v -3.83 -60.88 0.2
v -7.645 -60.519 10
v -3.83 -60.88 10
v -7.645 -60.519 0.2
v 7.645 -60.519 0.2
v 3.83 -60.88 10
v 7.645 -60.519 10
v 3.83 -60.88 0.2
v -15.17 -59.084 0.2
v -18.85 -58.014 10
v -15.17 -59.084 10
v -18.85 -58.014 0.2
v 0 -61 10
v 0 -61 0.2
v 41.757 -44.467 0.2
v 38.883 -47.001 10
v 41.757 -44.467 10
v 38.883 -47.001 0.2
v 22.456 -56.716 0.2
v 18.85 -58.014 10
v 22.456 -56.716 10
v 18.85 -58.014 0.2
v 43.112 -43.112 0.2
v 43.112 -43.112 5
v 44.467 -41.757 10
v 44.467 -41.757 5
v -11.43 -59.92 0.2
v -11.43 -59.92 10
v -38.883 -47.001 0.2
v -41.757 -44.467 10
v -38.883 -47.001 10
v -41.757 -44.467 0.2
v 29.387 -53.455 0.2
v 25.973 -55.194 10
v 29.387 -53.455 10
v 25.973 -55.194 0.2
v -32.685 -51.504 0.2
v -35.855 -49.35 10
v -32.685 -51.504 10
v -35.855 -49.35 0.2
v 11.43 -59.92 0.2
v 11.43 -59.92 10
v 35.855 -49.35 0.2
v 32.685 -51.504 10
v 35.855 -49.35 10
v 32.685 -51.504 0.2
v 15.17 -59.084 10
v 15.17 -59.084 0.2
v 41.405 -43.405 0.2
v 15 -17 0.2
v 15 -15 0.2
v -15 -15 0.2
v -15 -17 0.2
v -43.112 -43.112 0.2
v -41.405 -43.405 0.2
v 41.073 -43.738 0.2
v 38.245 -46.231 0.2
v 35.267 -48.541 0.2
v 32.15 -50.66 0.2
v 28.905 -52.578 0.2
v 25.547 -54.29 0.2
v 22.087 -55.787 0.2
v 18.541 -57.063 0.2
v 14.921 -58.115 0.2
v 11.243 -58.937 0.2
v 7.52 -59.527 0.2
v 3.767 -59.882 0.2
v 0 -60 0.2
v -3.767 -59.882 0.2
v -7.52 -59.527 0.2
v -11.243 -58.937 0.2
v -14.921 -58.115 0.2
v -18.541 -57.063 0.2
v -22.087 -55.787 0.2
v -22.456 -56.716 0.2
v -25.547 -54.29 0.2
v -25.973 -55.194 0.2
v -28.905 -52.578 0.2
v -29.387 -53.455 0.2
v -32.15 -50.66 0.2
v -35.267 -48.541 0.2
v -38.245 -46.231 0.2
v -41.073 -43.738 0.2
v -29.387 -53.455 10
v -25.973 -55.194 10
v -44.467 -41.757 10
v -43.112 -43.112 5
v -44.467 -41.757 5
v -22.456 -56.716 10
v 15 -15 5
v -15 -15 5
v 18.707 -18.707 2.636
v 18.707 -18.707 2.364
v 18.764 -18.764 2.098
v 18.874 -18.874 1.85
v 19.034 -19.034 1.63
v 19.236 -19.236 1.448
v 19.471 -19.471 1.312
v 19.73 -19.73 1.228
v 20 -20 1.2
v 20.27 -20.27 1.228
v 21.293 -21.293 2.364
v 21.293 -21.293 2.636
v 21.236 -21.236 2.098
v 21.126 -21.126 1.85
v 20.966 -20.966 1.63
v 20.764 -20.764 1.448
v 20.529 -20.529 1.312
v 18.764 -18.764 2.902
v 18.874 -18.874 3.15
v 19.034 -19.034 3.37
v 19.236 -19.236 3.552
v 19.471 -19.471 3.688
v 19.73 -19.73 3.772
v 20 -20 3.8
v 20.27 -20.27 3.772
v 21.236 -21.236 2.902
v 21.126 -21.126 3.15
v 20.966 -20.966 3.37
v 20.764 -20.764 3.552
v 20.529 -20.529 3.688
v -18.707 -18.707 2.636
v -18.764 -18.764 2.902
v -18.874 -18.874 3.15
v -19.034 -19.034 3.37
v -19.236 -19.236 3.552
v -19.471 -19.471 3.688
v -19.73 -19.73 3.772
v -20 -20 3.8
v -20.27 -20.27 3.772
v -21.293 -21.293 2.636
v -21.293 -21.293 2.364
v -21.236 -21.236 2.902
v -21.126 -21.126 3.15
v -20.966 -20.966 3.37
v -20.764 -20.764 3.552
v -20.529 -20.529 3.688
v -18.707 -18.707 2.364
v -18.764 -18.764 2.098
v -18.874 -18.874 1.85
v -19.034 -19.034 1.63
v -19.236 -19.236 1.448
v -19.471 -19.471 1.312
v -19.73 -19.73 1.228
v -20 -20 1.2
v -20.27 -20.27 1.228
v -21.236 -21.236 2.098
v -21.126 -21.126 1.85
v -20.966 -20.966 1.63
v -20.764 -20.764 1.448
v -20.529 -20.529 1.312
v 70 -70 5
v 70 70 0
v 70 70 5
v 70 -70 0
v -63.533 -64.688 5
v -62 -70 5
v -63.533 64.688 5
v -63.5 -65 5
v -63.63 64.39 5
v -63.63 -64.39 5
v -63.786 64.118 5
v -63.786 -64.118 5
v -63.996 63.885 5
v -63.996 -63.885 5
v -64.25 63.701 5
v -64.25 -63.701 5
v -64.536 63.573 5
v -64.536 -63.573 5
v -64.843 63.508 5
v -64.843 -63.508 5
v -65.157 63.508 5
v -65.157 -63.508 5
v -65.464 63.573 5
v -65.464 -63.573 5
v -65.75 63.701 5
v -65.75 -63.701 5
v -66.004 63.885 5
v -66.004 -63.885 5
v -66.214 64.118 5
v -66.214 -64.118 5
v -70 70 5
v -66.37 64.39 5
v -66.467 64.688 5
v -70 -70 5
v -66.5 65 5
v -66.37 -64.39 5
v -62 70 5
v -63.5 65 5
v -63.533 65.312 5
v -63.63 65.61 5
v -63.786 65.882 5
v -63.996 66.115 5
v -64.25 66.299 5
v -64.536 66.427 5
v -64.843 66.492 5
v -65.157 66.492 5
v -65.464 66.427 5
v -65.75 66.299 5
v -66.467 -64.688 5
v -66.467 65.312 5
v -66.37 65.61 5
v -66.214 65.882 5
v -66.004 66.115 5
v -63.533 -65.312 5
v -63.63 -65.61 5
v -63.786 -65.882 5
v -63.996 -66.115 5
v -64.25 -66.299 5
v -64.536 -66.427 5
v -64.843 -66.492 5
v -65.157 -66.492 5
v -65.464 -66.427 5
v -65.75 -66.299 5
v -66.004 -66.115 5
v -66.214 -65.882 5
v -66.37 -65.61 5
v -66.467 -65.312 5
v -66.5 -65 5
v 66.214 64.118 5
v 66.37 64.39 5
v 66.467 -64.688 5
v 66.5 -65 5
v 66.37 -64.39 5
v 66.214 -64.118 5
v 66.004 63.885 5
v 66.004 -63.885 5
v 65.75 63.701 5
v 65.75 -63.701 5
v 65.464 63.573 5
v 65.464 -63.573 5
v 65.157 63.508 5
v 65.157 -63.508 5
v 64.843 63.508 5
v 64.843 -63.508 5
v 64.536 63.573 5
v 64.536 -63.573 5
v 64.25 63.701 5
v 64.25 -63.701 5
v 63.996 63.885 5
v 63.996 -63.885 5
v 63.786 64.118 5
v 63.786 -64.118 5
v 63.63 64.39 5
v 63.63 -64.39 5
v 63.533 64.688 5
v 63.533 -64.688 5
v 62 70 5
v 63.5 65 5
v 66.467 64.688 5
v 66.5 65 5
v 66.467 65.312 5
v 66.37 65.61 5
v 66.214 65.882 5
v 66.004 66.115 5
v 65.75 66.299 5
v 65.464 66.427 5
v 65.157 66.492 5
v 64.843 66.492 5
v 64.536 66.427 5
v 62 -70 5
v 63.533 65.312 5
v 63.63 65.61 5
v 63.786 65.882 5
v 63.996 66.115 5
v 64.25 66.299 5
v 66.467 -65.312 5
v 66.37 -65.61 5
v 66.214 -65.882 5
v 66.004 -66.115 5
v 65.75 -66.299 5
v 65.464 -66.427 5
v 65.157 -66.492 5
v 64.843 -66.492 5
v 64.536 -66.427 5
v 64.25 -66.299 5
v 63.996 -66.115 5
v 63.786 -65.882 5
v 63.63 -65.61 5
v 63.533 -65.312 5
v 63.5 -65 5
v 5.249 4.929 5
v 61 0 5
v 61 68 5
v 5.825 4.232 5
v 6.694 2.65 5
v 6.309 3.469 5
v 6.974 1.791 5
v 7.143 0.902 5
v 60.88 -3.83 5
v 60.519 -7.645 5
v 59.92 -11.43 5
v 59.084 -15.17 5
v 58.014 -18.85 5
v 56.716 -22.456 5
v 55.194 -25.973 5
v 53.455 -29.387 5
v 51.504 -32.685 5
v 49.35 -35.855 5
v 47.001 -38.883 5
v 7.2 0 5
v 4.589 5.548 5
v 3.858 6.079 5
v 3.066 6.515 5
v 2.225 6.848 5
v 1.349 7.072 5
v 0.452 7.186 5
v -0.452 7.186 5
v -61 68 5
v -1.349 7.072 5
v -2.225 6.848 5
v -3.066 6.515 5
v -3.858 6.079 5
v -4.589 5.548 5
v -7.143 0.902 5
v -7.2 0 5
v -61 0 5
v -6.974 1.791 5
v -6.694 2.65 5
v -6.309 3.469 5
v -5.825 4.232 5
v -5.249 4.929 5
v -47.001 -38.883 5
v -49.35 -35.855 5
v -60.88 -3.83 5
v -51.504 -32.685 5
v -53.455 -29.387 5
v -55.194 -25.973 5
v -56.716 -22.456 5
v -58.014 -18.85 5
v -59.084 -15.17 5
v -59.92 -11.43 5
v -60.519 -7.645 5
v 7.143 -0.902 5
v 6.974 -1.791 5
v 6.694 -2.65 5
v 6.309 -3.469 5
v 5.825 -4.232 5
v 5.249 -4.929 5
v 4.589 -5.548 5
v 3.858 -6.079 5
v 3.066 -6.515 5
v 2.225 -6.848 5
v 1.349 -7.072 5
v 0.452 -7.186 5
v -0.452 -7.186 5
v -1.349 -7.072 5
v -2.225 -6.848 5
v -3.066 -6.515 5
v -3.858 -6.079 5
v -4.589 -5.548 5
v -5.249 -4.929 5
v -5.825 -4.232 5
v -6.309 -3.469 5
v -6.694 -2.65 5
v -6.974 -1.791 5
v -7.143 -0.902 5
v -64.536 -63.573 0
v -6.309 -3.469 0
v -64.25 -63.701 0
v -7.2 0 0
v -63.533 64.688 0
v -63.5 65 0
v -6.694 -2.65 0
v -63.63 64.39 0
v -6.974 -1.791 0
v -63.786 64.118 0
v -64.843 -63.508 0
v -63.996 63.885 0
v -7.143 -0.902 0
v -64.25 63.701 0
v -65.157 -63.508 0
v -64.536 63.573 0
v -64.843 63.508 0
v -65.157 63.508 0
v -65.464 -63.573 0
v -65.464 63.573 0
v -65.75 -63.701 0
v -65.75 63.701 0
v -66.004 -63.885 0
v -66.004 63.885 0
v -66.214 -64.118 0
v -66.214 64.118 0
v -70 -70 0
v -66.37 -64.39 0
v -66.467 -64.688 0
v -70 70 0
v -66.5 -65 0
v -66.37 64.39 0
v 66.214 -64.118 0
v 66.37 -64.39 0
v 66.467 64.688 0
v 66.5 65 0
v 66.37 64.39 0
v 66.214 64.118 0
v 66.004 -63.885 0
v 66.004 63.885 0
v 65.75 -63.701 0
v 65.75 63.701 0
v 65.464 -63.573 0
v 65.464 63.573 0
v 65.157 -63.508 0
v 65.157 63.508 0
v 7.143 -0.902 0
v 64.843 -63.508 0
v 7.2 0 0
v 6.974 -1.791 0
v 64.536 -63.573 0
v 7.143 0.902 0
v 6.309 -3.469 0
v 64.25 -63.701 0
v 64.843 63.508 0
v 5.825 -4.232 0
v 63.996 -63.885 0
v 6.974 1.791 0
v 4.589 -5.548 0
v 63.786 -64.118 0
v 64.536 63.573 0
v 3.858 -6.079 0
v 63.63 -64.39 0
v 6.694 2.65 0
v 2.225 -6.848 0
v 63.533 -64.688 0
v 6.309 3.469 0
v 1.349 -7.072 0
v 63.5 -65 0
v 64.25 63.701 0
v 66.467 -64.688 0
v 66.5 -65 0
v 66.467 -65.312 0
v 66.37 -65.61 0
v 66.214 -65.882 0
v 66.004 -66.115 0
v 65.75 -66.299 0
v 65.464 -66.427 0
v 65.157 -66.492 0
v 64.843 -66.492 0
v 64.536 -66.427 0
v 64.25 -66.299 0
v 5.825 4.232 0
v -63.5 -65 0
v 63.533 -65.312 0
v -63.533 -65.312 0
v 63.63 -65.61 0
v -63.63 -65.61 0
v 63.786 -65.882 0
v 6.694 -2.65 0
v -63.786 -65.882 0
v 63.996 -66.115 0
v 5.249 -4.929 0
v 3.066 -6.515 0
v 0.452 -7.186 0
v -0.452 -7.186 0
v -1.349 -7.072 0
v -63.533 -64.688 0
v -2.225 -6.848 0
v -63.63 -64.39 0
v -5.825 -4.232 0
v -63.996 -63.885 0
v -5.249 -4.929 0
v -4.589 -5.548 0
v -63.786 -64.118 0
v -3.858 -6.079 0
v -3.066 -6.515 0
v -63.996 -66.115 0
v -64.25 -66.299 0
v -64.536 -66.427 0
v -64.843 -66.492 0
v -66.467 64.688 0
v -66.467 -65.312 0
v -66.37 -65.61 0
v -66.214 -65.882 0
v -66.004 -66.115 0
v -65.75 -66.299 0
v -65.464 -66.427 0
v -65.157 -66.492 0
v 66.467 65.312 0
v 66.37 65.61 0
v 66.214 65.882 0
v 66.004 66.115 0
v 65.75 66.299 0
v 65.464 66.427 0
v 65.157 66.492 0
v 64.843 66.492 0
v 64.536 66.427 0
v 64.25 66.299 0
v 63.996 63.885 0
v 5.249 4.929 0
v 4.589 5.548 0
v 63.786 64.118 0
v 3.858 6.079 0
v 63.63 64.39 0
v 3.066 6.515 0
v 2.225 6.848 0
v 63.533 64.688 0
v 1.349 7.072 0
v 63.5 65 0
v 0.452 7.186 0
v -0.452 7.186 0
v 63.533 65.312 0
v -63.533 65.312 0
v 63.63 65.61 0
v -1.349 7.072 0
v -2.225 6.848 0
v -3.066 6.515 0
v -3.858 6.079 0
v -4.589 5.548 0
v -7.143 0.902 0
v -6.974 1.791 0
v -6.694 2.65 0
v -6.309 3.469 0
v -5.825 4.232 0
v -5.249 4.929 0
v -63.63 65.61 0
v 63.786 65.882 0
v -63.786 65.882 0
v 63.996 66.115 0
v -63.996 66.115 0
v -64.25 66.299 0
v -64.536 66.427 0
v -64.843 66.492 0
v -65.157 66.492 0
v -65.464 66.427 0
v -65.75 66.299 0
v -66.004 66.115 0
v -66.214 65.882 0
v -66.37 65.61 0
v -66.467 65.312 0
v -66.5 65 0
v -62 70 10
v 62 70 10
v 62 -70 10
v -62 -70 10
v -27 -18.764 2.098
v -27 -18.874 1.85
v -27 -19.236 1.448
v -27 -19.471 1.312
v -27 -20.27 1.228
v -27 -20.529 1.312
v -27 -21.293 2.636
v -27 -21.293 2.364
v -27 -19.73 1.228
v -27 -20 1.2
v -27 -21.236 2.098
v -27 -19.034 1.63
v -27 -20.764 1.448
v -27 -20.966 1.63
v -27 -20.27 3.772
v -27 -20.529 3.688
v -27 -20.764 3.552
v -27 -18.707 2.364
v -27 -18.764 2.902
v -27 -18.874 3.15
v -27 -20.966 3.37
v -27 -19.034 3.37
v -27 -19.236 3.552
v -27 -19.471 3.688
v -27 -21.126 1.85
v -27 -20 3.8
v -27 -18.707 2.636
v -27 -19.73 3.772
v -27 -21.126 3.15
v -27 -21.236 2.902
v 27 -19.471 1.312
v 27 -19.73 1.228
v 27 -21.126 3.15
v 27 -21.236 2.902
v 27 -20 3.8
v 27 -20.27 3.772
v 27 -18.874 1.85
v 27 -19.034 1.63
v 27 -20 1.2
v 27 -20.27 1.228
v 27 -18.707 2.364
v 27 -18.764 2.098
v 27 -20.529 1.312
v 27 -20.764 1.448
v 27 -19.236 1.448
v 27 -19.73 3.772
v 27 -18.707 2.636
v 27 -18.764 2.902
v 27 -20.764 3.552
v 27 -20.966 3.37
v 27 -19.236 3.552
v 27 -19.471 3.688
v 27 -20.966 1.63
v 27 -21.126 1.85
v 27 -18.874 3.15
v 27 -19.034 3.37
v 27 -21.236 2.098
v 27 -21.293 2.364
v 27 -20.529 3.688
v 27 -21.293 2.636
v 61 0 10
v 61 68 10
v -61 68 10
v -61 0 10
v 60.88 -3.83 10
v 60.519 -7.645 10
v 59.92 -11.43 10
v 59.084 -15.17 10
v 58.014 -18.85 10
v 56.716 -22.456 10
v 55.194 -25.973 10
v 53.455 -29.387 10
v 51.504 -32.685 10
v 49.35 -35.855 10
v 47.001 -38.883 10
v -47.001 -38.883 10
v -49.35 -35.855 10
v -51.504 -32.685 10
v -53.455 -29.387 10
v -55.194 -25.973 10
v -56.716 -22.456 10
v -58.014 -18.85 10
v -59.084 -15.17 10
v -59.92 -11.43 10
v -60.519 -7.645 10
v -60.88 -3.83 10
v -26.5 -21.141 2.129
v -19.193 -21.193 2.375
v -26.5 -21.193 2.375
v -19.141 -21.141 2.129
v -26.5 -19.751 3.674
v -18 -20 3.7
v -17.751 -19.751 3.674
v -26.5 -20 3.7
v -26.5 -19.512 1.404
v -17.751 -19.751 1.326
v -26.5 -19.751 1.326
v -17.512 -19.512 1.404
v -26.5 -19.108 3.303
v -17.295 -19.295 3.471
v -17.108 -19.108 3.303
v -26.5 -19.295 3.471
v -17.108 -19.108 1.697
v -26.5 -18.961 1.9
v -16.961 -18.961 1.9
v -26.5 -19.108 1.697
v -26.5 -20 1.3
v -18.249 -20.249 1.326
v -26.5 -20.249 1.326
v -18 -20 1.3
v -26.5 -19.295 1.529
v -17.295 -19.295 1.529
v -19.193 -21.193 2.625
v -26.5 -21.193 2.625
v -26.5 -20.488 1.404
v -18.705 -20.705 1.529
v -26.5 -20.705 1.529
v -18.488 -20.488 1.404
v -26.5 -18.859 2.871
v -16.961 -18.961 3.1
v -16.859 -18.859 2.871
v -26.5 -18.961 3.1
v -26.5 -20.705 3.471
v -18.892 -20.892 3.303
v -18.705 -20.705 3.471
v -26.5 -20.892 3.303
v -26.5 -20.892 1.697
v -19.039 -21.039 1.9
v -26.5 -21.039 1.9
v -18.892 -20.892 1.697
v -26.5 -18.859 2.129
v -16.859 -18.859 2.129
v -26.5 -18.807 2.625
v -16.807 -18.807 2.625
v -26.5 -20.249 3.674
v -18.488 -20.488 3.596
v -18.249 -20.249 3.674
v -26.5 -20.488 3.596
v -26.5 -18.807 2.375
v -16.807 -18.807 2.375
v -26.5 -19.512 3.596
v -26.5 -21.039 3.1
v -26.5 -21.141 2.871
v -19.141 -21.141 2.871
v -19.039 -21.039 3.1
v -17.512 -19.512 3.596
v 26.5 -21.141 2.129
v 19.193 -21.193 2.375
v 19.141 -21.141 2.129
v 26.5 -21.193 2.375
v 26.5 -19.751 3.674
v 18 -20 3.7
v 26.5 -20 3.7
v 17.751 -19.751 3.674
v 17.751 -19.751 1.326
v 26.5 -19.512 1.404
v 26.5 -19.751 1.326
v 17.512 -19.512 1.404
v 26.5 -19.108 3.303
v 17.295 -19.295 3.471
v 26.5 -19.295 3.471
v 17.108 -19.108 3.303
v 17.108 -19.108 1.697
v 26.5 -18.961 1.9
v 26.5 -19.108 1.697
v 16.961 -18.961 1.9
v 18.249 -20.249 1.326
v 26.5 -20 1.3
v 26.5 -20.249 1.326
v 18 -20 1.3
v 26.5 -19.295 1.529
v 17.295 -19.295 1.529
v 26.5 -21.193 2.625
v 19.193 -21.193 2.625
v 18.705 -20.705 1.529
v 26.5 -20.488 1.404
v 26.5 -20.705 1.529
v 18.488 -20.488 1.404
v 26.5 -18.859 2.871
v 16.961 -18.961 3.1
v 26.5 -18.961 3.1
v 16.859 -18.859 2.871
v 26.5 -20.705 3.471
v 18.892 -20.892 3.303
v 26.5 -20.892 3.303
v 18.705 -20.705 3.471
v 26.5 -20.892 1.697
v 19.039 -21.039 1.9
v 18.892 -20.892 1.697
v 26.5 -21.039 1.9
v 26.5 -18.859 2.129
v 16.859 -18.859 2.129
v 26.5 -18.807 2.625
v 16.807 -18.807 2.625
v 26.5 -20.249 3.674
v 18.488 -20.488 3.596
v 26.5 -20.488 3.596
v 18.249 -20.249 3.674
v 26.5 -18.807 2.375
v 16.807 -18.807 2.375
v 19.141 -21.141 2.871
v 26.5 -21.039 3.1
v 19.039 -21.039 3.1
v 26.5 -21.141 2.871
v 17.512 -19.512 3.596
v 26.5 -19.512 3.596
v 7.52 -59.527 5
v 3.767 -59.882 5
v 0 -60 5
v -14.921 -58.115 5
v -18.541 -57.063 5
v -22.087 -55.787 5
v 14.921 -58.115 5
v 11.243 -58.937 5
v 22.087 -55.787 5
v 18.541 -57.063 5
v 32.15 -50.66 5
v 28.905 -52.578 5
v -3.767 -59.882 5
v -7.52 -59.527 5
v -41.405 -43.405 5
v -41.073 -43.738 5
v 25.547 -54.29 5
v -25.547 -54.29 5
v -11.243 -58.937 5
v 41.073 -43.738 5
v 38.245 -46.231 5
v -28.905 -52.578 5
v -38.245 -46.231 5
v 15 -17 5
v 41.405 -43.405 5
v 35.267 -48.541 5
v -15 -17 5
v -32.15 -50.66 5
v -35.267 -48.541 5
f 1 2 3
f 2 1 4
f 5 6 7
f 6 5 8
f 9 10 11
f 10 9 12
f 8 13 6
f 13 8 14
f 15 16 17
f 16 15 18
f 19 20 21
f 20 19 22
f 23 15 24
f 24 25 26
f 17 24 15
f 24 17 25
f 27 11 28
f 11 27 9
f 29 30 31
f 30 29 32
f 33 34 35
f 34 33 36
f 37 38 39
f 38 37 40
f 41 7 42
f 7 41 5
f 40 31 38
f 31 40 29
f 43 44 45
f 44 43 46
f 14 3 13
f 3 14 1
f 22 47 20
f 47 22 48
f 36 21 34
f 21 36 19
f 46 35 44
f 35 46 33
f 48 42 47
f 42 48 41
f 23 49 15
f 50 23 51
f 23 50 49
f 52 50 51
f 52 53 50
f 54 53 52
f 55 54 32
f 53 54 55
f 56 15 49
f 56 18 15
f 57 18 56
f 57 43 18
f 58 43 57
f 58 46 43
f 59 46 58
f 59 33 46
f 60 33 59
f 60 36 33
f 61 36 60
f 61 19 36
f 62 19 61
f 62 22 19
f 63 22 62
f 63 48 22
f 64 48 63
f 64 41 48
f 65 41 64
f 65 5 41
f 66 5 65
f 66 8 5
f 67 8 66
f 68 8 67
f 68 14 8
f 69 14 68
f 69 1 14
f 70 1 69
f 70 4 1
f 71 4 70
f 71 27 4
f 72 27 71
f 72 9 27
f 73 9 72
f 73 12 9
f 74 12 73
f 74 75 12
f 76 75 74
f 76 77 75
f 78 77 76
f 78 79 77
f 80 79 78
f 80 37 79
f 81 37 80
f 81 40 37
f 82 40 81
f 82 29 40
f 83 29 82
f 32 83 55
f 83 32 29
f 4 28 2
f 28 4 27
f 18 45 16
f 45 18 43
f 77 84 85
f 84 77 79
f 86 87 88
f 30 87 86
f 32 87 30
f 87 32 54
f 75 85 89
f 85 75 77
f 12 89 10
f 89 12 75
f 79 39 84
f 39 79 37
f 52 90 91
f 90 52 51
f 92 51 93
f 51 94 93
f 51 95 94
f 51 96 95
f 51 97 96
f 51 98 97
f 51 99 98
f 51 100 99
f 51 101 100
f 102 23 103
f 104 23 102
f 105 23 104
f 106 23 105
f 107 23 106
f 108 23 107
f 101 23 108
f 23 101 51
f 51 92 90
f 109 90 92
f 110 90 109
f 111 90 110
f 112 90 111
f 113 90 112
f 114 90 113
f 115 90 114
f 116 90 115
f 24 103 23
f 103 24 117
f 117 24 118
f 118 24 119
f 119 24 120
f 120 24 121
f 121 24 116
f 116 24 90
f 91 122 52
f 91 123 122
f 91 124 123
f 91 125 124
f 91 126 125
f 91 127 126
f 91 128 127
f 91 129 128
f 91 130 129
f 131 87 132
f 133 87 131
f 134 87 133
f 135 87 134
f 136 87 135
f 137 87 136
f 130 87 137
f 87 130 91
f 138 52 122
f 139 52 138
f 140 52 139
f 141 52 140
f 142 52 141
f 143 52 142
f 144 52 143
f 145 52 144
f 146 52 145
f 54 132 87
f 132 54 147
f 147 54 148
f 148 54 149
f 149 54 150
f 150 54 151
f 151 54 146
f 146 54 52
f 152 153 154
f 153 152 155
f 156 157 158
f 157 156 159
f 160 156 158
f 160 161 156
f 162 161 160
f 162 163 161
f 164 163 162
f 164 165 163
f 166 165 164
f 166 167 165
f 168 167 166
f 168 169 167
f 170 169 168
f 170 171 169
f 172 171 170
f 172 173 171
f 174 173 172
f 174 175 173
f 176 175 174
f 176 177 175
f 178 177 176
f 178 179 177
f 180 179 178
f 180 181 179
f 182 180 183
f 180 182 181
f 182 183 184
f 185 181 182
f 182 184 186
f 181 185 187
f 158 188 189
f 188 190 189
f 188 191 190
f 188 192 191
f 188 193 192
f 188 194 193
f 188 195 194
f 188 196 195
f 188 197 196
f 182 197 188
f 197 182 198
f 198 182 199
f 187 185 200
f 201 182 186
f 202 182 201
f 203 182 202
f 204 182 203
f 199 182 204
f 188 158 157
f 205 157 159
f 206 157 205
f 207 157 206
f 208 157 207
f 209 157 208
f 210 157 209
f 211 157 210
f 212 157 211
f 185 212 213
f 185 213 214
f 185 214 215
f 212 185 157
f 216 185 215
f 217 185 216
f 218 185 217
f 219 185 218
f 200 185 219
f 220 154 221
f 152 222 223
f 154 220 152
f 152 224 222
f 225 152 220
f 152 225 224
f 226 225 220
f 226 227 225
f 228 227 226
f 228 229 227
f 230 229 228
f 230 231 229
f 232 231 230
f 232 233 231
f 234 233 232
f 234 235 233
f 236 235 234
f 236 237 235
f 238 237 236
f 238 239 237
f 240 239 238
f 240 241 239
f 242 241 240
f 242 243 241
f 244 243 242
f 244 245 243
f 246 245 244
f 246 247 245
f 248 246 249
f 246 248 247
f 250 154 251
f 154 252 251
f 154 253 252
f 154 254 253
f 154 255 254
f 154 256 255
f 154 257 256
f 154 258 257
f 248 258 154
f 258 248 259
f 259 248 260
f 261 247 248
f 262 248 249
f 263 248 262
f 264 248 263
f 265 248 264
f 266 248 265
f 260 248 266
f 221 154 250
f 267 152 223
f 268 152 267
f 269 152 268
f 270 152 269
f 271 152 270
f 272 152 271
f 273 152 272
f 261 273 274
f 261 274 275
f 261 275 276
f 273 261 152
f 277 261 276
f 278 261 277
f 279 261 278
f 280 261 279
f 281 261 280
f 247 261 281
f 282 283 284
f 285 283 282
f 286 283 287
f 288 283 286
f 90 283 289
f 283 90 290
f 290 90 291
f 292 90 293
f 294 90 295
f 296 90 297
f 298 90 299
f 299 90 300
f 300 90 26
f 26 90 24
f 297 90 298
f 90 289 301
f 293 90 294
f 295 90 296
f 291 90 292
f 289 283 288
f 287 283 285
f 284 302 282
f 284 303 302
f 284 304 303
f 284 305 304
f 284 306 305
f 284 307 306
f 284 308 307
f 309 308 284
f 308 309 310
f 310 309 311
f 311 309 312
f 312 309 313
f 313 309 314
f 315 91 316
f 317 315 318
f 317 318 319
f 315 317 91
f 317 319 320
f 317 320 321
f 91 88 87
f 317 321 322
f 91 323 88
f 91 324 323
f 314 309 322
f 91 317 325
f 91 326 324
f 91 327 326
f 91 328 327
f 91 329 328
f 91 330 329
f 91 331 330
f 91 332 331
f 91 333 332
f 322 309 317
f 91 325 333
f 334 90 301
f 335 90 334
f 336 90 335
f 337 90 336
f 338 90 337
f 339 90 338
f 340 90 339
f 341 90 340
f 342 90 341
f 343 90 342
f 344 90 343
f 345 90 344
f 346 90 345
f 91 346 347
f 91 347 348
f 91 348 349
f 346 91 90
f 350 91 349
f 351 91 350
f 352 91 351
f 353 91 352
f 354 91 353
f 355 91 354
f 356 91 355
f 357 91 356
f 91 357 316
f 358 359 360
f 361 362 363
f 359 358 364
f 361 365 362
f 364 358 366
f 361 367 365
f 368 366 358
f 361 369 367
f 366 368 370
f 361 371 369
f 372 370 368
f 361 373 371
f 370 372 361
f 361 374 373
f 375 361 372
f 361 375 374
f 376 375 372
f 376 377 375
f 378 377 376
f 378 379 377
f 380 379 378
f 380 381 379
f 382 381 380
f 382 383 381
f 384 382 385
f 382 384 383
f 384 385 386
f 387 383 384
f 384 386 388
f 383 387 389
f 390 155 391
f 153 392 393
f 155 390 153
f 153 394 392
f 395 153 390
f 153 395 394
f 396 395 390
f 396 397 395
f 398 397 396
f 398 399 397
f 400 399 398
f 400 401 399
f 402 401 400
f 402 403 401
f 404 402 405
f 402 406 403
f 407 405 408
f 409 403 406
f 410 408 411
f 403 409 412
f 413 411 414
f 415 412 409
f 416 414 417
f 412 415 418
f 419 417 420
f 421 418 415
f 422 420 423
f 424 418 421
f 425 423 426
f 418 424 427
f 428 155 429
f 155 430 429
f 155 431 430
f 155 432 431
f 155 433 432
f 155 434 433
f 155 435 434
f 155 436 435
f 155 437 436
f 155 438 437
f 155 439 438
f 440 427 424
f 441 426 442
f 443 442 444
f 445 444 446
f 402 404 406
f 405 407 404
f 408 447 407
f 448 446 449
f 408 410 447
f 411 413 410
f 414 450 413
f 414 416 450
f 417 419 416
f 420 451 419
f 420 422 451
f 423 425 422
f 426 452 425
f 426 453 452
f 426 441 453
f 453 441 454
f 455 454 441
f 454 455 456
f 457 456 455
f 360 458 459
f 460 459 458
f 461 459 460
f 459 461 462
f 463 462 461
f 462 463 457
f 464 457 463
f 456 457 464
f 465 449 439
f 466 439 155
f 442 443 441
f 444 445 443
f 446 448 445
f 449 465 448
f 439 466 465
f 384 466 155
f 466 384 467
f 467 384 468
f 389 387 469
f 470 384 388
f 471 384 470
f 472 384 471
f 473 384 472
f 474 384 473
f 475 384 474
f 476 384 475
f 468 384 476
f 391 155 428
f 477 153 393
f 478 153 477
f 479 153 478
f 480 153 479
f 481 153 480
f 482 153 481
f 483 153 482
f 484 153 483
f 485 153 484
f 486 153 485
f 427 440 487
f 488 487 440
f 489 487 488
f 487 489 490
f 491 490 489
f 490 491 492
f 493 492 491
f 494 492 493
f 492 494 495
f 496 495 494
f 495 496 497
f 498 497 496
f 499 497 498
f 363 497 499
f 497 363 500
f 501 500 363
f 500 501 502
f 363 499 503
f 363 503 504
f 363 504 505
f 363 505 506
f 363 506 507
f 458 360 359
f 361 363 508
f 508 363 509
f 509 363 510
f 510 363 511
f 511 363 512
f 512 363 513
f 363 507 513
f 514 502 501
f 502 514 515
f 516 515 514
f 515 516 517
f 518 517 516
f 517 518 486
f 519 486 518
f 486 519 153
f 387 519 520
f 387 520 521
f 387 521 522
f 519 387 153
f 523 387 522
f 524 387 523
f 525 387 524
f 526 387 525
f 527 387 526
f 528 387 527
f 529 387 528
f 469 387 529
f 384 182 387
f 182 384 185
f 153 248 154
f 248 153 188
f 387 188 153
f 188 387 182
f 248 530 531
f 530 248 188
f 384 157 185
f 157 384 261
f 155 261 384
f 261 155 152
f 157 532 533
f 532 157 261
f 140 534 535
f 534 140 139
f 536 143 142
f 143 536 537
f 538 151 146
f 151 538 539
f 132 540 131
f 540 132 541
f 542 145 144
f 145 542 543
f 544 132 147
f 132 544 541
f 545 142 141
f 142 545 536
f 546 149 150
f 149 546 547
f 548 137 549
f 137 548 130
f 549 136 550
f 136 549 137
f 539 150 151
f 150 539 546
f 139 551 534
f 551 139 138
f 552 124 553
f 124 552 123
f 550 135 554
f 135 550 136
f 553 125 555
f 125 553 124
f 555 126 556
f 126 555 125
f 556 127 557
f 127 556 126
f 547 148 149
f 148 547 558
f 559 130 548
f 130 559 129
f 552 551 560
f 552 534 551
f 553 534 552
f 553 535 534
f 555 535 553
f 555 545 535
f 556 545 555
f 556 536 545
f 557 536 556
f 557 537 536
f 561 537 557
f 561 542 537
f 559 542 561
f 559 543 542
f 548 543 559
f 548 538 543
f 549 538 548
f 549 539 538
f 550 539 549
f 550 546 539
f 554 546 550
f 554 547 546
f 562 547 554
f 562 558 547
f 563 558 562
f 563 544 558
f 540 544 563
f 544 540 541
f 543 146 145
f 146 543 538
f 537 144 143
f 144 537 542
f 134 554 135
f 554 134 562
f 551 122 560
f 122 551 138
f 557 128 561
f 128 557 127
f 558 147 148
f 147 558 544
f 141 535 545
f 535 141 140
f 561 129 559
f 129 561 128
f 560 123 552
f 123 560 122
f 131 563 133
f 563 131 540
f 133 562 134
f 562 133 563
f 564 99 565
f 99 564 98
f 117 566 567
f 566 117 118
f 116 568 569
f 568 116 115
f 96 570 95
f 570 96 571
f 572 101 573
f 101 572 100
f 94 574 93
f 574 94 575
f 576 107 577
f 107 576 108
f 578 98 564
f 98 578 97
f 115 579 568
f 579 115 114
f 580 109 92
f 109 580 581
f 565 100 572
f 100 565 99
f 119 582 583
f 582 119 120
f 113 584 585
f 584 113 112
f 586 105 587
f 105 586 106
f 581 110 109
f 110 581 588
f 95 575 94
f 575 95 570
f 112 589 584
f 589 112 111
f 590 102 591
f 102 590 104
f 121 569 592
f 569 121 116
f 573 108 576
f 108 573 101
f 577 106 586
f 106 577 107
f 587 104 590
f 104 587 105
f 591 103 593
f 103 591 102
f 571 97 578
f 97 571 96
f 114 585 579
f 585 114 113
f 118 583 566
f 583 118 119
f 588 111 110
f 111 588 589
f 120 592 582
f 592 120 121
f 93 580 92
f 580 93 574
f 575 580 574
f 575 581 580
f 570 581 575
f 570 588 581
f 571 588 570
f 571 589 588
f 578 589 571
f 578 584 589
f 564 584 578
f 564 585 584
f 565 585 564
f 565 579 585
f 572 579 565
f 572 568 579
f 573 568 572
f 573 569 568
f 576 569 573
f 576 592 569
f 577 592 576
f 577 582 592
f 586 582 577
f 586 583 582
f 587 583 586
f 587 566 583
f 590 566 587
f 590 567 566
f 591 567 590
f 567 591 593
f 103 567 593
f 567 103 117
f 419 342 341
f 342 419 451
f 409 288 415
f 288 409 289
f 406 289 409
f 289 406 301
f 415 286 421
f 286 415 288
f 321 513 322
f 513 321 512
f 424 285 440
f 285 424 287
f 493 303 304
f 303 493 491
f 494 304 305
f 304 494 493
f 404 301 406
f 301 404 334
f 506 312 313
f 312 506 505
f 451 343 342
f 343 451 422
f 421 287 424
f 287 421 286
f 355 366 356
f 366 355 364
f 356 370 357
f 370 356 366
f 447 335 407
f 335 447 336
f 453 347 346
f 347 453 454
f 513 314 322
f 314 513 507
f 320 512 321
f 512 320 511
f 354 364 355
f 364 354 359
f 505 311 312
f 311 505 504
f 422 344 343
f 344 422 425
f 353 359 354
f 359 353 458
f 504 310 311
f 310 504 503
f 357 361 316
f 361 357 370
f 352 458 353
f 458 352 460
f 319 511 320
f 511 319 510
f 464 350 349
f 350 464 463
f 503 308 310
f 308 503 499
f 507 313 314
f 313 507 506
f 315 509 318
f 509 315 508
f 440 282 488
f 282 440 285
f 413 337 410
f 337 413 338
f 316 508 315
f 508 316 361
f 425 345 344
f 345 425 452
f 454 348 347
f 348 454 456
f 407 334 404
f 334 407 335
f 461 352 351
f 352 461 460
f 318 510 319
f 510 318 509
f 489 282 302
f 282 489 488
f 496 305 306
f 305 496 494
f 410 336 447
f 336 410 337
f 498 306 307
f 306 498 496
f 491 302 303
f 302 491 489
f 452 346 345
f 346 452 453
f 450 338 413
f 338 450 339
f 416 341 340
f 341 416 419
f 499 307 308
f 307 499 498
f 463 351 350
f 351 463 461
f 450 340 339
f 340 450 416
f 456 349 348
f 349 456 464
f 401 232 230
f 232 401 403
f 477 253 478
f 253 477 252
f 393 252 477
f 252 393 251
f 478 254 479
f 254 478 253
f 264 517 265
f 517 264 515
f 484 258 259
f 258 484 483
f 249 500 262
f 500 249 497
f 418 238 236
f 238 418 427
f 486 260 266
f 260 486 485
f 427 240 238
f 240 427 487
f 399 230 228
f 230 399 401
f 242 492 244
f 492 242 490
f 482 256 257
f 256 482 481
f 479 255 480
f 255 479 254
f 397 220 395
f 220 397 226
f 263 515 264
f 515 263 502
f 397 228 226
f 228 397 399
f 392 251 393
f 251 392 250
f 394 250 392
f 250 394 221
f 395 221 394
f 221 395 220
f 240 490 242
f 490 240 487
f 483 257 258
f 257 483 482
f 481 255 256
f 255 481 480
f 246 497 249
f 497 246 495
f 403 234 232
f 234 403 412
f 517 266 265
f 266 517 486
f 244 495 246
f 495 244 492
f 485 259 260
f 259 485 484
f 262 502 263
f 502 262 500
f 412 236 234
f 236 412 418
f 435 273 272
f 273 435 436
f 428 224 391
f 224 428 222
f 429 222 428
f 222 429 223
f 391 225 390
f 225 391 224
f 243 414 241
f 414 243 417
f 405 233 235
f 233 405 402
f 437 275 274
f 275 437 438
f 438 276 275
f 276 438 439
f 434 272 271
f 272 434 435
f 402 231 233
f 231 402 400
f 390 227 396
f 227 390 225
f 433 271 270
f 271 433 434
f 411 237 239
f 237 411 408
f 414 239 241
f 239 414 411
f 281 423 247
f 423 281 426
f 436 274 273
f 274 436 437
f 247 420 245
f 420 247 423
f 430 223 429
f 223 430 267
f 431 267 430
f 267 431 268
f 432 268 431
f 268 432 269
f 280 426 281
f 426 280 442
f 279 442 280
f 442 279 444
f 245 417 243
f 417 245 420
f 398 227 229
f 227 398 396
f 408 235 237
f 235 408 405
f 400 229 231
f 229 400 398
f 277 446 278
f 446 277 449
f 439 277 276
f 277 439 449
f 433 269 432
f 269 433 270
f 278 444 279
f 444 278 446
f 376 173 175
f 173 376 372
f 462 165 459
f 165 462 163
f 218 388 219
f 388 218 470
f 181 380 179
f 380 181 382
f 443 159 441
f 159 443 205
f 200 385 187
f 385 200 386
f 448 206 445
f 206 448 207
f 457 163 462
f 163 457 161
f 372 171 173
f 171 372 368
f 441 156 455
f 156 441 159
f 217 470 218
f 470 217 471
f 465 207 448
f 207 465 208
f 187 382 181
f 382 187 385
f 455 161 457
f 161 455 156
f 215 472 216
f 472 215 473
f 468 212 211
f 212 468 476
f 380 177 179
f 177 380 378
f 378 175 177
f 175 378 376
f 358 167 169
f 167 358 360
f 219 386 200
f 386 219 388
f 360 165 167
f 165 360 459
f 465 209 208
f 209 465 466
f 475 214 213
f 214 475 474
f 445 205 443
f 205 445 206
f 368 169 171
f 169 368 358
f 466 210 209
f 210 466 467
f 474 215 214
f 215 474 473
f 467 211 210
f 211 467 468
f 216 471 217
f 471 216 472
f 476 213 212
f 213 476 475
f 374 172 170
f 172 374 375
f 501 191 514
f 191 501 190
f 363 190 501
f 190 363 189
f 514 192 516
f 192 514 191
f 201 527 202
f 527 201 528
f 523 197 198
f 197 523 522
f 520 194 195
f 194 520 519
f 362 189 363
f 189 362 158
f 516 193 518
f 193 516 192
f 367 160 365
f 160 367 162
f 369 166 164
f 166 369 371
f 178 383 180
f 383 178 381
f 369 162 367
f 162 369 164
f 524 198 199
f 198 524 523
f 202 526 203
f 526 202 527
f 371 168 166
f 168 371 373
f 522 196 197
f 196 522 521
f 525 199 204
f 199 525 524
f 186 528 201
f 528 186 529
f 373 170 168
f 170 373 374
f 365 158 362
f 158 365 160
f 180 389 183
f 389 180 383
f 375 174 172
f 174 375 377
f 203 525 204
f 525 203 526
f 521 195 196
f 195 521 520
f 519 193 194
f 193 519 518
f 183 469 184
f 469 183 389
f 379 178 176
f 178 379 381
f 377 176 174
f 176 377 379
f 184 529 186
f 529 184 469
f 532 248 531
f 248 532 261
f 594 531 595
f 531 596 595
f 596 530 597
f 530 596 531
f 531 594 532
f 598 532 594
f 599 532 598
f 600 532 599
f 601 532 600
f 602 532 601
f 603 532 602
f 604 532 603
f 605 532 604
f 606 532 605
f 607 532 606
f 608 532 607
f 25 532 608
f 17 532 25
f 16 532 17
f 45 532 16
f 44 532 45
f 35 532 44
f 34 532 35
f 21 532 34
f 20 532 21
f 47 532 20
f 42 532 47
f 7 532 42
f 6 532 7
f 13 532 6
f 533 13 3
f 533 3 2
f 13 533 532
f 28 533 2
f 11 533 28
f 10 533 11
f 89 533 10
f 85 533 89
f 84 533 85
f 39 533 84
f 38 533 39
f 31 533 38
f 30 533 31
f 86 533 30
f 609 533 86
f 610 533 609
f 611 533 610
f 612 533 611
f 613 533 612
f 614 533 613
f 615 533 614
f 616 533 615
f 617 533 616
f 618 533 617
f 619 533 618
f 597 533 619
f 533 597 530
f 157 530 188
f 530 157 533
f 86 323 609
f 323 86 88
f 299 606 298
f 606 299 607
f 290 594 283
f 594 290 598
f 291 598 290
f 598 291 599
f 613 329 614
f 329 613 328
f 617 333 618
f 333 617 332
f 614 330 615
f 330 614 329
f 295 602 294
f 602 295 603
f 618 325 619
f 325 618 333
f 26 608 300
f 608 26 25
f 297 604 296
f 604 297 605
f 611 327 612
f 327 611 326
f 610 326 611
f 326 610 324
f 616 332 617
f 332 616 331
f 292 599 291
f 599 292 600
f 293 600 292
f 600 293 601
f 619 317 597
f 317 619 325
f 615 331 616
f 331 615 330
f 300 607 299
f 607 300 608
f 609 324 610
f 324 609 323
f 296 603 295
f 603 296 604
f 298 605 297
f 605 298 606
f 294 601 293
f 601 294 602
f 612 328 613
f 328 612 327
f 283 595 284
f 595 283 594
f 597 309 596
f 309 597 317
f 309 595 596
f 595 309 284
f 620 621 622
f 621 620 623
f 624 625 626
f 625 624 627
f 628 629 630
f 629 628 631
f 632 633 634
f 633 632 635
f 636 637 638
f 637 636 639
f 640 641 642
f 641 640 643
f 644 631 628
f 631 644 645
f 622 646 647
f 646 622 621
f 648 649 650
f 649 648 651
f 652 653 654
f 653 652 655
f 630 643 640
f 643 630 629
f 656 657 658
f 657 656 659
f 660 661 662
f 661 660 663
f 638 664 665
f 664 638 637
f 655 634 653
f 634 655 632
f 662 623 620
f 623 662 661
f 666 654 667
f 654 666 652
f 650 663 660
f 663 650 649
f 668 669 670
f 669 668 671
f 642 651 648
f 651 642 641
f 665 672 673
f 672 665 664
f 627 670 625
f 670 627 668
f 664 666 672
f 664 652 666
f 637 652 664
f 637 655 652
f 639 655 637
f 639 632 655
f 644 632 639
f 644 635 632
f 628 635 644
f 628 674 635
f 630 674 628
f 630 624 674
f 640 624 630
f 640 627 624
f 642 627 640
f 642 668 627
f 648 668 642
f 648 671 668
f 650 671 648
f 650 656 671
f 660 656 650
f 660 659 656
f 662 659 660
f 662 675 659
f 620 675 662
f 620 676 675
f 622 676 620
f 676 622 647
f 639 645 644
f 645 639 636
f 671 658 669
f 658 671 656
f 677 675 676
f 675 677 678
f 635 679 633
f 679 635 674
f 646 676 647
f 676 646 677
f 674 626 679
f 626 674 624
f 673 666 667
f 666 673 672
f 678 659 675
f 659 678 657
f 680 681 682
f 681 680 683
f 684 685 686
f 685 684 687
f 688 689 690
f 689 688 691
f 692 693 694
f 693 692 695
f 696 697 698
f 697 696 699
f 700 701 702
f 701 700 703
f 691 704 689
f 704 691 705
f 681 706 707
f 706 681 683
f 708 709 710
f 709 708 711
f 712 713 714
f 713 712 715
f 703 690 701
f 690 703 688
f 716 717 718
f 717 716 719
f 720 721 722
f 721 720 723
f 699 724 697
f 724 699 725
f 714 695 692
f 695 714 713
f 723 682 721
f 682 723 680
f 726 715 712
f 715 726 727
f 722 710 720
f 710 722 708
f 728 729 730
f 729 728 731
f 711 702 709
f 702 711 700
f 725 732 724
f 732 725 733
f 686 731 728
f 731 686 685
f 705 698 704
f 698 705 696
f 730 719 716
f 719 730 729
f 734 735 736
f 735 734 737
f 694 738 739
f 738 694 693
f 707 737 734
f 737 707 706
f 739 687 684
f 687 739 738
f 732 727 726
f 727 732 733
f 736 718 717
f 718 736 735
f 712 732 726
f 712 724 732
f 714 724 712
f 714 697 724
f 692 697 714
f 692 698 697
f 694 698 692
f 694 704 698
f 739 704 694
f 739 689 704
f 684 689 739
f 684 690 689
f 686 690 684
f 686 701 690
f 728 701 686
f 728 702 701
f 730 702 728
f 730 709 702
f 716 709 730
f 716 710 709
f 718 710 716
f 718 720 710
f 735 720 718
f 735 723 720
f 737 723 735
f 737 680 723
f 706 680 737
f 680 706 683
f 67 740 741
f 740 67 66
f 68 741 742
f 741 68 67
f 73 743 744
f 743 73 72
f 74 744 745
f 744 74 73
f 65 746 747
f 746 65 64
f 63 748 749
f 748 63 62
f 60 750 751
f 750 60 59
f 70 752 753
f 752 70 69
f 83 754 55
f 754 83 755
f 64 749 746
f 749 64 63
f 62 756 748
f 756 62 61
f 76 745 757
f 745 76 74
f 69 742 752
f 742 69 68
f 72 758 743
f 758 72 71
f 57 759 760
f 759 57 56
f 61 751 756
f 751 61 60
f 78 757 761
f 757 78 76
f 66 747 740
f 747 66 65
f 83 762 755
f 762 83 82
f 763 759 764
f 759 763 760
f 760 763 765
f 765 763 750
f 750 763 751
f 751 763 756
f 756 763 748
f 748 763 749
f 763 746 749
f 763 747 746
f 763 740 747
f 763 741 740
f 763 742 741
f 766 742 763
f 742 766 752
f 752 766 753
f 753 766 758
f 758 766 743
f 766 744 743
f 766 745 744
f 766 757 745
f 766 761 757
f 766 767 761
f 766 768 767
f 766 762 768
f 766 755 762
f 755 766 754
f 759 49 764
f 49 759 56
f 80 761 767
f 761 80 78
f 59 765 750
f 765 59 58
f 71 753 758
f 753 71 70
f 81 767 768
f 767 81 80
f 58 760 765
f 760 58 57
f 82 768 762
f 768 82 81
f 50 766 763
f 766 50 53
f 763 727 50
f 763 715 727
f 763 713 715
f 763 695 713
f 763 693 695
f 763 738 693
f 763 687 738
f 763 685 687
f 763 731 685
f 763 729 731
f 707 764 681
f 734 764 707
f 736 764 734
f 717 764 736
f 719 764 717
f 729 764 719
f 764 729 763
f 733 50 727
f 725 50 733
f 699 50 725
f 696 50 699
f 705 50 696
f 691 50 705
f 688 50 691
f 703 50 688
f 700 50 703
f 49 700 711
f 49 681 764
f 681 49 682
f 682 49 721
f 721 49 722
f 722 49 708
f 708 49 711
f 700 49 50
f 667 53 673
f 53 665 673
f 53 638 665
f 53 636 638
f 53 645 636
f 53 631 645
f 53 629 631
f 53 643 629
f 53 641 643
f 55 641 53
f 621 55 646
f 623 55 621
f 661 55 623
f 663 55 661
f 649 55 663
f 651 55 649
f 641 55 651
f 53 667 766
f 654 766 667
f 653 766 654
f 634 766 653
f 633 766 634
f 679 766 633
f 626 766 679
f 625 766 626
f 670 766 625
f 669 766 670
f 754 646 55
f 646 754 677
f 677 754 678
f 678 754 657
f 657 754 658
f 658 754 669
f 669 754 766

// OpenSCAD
union() {
  difference(){
    // Frame
    translate([-70,-70,0]) cube([140,140,5], false);
    // Auger inset
    //translate([0,0,2]) cylinder(3, 60, 60, false, $fn=50);
    
    // Food Opening
    translate([0,0,0.2]) difference(){
      cylinder(10, 61, 61, false, $fn=100);
      //cylinder(10, 16, 16, false, $fn=100);
      translate([-70,-15,0]) cube([140,140,10], false);
      rotate([0,0,-45]) cube([65,65,10], false);
      rotate([0,0,45]) cube([65,65,10], false);
      rotate([0,0,135]) cube([65,65,10], false);
    }
    
    translate([-22,-20,2.5]) rotate([0,90,0]) cylinder(10,1.3,1.3,true,$fn=30);
    translate([22,-20,2.5]) rotate([0,90,0]) cylinder(10,1.3,1.3,true,$fn=30);
    
    // Inner Axel
    cylinder(10, 7.2, 7.2, false, $fn=50);
    
    // Screw holes and nut catches
    translate([65, 65, 0]) cylinder(10, 1.5, 1.5, false, $fn=30);
    translate([65, -65, 0]) cylinder(10, 1.5, 1.5, false, $fn=30);
    translate([-65, -65, 0]) cylinder(10, 1.5, 1.5, false, $fn=30);
    translate([-65, 65, 0]) cylinder(10, 1.5, 1.5, false, $fn=30);
  }
  // Lower Track
  difference(){
    translate([-124/2,-70,0]) cube([124,140,10], false);
    cylinder(100, 61, 61, false, $fn=100);
    translate([-122/2,0,2]) cube([122,68,8], false);
  }
  translate([-21.5,-20,2.5]) rotate([0,90,0]) cylinder(10,1.2,1.2,true,$fn=30);
  translate([21.5,-20,2.5]) rotate([0,90,0]) cylinder(10,1.2,1.2,true,$fn=30);
}
difference(){
  cylinder(5, 60, 60, false, $fn=100);
  // cylinder(10, 17, 17, false, $fn=100);
  translate([-70,-17,0]) cube([140,140,10], false);
  translate([-2,0,0]) rotate([0,0,-45]) cube([65,65,10], false);
  translate([2,0,0]) rotate([0,0,135]) cube([65,65,10], false);
}
